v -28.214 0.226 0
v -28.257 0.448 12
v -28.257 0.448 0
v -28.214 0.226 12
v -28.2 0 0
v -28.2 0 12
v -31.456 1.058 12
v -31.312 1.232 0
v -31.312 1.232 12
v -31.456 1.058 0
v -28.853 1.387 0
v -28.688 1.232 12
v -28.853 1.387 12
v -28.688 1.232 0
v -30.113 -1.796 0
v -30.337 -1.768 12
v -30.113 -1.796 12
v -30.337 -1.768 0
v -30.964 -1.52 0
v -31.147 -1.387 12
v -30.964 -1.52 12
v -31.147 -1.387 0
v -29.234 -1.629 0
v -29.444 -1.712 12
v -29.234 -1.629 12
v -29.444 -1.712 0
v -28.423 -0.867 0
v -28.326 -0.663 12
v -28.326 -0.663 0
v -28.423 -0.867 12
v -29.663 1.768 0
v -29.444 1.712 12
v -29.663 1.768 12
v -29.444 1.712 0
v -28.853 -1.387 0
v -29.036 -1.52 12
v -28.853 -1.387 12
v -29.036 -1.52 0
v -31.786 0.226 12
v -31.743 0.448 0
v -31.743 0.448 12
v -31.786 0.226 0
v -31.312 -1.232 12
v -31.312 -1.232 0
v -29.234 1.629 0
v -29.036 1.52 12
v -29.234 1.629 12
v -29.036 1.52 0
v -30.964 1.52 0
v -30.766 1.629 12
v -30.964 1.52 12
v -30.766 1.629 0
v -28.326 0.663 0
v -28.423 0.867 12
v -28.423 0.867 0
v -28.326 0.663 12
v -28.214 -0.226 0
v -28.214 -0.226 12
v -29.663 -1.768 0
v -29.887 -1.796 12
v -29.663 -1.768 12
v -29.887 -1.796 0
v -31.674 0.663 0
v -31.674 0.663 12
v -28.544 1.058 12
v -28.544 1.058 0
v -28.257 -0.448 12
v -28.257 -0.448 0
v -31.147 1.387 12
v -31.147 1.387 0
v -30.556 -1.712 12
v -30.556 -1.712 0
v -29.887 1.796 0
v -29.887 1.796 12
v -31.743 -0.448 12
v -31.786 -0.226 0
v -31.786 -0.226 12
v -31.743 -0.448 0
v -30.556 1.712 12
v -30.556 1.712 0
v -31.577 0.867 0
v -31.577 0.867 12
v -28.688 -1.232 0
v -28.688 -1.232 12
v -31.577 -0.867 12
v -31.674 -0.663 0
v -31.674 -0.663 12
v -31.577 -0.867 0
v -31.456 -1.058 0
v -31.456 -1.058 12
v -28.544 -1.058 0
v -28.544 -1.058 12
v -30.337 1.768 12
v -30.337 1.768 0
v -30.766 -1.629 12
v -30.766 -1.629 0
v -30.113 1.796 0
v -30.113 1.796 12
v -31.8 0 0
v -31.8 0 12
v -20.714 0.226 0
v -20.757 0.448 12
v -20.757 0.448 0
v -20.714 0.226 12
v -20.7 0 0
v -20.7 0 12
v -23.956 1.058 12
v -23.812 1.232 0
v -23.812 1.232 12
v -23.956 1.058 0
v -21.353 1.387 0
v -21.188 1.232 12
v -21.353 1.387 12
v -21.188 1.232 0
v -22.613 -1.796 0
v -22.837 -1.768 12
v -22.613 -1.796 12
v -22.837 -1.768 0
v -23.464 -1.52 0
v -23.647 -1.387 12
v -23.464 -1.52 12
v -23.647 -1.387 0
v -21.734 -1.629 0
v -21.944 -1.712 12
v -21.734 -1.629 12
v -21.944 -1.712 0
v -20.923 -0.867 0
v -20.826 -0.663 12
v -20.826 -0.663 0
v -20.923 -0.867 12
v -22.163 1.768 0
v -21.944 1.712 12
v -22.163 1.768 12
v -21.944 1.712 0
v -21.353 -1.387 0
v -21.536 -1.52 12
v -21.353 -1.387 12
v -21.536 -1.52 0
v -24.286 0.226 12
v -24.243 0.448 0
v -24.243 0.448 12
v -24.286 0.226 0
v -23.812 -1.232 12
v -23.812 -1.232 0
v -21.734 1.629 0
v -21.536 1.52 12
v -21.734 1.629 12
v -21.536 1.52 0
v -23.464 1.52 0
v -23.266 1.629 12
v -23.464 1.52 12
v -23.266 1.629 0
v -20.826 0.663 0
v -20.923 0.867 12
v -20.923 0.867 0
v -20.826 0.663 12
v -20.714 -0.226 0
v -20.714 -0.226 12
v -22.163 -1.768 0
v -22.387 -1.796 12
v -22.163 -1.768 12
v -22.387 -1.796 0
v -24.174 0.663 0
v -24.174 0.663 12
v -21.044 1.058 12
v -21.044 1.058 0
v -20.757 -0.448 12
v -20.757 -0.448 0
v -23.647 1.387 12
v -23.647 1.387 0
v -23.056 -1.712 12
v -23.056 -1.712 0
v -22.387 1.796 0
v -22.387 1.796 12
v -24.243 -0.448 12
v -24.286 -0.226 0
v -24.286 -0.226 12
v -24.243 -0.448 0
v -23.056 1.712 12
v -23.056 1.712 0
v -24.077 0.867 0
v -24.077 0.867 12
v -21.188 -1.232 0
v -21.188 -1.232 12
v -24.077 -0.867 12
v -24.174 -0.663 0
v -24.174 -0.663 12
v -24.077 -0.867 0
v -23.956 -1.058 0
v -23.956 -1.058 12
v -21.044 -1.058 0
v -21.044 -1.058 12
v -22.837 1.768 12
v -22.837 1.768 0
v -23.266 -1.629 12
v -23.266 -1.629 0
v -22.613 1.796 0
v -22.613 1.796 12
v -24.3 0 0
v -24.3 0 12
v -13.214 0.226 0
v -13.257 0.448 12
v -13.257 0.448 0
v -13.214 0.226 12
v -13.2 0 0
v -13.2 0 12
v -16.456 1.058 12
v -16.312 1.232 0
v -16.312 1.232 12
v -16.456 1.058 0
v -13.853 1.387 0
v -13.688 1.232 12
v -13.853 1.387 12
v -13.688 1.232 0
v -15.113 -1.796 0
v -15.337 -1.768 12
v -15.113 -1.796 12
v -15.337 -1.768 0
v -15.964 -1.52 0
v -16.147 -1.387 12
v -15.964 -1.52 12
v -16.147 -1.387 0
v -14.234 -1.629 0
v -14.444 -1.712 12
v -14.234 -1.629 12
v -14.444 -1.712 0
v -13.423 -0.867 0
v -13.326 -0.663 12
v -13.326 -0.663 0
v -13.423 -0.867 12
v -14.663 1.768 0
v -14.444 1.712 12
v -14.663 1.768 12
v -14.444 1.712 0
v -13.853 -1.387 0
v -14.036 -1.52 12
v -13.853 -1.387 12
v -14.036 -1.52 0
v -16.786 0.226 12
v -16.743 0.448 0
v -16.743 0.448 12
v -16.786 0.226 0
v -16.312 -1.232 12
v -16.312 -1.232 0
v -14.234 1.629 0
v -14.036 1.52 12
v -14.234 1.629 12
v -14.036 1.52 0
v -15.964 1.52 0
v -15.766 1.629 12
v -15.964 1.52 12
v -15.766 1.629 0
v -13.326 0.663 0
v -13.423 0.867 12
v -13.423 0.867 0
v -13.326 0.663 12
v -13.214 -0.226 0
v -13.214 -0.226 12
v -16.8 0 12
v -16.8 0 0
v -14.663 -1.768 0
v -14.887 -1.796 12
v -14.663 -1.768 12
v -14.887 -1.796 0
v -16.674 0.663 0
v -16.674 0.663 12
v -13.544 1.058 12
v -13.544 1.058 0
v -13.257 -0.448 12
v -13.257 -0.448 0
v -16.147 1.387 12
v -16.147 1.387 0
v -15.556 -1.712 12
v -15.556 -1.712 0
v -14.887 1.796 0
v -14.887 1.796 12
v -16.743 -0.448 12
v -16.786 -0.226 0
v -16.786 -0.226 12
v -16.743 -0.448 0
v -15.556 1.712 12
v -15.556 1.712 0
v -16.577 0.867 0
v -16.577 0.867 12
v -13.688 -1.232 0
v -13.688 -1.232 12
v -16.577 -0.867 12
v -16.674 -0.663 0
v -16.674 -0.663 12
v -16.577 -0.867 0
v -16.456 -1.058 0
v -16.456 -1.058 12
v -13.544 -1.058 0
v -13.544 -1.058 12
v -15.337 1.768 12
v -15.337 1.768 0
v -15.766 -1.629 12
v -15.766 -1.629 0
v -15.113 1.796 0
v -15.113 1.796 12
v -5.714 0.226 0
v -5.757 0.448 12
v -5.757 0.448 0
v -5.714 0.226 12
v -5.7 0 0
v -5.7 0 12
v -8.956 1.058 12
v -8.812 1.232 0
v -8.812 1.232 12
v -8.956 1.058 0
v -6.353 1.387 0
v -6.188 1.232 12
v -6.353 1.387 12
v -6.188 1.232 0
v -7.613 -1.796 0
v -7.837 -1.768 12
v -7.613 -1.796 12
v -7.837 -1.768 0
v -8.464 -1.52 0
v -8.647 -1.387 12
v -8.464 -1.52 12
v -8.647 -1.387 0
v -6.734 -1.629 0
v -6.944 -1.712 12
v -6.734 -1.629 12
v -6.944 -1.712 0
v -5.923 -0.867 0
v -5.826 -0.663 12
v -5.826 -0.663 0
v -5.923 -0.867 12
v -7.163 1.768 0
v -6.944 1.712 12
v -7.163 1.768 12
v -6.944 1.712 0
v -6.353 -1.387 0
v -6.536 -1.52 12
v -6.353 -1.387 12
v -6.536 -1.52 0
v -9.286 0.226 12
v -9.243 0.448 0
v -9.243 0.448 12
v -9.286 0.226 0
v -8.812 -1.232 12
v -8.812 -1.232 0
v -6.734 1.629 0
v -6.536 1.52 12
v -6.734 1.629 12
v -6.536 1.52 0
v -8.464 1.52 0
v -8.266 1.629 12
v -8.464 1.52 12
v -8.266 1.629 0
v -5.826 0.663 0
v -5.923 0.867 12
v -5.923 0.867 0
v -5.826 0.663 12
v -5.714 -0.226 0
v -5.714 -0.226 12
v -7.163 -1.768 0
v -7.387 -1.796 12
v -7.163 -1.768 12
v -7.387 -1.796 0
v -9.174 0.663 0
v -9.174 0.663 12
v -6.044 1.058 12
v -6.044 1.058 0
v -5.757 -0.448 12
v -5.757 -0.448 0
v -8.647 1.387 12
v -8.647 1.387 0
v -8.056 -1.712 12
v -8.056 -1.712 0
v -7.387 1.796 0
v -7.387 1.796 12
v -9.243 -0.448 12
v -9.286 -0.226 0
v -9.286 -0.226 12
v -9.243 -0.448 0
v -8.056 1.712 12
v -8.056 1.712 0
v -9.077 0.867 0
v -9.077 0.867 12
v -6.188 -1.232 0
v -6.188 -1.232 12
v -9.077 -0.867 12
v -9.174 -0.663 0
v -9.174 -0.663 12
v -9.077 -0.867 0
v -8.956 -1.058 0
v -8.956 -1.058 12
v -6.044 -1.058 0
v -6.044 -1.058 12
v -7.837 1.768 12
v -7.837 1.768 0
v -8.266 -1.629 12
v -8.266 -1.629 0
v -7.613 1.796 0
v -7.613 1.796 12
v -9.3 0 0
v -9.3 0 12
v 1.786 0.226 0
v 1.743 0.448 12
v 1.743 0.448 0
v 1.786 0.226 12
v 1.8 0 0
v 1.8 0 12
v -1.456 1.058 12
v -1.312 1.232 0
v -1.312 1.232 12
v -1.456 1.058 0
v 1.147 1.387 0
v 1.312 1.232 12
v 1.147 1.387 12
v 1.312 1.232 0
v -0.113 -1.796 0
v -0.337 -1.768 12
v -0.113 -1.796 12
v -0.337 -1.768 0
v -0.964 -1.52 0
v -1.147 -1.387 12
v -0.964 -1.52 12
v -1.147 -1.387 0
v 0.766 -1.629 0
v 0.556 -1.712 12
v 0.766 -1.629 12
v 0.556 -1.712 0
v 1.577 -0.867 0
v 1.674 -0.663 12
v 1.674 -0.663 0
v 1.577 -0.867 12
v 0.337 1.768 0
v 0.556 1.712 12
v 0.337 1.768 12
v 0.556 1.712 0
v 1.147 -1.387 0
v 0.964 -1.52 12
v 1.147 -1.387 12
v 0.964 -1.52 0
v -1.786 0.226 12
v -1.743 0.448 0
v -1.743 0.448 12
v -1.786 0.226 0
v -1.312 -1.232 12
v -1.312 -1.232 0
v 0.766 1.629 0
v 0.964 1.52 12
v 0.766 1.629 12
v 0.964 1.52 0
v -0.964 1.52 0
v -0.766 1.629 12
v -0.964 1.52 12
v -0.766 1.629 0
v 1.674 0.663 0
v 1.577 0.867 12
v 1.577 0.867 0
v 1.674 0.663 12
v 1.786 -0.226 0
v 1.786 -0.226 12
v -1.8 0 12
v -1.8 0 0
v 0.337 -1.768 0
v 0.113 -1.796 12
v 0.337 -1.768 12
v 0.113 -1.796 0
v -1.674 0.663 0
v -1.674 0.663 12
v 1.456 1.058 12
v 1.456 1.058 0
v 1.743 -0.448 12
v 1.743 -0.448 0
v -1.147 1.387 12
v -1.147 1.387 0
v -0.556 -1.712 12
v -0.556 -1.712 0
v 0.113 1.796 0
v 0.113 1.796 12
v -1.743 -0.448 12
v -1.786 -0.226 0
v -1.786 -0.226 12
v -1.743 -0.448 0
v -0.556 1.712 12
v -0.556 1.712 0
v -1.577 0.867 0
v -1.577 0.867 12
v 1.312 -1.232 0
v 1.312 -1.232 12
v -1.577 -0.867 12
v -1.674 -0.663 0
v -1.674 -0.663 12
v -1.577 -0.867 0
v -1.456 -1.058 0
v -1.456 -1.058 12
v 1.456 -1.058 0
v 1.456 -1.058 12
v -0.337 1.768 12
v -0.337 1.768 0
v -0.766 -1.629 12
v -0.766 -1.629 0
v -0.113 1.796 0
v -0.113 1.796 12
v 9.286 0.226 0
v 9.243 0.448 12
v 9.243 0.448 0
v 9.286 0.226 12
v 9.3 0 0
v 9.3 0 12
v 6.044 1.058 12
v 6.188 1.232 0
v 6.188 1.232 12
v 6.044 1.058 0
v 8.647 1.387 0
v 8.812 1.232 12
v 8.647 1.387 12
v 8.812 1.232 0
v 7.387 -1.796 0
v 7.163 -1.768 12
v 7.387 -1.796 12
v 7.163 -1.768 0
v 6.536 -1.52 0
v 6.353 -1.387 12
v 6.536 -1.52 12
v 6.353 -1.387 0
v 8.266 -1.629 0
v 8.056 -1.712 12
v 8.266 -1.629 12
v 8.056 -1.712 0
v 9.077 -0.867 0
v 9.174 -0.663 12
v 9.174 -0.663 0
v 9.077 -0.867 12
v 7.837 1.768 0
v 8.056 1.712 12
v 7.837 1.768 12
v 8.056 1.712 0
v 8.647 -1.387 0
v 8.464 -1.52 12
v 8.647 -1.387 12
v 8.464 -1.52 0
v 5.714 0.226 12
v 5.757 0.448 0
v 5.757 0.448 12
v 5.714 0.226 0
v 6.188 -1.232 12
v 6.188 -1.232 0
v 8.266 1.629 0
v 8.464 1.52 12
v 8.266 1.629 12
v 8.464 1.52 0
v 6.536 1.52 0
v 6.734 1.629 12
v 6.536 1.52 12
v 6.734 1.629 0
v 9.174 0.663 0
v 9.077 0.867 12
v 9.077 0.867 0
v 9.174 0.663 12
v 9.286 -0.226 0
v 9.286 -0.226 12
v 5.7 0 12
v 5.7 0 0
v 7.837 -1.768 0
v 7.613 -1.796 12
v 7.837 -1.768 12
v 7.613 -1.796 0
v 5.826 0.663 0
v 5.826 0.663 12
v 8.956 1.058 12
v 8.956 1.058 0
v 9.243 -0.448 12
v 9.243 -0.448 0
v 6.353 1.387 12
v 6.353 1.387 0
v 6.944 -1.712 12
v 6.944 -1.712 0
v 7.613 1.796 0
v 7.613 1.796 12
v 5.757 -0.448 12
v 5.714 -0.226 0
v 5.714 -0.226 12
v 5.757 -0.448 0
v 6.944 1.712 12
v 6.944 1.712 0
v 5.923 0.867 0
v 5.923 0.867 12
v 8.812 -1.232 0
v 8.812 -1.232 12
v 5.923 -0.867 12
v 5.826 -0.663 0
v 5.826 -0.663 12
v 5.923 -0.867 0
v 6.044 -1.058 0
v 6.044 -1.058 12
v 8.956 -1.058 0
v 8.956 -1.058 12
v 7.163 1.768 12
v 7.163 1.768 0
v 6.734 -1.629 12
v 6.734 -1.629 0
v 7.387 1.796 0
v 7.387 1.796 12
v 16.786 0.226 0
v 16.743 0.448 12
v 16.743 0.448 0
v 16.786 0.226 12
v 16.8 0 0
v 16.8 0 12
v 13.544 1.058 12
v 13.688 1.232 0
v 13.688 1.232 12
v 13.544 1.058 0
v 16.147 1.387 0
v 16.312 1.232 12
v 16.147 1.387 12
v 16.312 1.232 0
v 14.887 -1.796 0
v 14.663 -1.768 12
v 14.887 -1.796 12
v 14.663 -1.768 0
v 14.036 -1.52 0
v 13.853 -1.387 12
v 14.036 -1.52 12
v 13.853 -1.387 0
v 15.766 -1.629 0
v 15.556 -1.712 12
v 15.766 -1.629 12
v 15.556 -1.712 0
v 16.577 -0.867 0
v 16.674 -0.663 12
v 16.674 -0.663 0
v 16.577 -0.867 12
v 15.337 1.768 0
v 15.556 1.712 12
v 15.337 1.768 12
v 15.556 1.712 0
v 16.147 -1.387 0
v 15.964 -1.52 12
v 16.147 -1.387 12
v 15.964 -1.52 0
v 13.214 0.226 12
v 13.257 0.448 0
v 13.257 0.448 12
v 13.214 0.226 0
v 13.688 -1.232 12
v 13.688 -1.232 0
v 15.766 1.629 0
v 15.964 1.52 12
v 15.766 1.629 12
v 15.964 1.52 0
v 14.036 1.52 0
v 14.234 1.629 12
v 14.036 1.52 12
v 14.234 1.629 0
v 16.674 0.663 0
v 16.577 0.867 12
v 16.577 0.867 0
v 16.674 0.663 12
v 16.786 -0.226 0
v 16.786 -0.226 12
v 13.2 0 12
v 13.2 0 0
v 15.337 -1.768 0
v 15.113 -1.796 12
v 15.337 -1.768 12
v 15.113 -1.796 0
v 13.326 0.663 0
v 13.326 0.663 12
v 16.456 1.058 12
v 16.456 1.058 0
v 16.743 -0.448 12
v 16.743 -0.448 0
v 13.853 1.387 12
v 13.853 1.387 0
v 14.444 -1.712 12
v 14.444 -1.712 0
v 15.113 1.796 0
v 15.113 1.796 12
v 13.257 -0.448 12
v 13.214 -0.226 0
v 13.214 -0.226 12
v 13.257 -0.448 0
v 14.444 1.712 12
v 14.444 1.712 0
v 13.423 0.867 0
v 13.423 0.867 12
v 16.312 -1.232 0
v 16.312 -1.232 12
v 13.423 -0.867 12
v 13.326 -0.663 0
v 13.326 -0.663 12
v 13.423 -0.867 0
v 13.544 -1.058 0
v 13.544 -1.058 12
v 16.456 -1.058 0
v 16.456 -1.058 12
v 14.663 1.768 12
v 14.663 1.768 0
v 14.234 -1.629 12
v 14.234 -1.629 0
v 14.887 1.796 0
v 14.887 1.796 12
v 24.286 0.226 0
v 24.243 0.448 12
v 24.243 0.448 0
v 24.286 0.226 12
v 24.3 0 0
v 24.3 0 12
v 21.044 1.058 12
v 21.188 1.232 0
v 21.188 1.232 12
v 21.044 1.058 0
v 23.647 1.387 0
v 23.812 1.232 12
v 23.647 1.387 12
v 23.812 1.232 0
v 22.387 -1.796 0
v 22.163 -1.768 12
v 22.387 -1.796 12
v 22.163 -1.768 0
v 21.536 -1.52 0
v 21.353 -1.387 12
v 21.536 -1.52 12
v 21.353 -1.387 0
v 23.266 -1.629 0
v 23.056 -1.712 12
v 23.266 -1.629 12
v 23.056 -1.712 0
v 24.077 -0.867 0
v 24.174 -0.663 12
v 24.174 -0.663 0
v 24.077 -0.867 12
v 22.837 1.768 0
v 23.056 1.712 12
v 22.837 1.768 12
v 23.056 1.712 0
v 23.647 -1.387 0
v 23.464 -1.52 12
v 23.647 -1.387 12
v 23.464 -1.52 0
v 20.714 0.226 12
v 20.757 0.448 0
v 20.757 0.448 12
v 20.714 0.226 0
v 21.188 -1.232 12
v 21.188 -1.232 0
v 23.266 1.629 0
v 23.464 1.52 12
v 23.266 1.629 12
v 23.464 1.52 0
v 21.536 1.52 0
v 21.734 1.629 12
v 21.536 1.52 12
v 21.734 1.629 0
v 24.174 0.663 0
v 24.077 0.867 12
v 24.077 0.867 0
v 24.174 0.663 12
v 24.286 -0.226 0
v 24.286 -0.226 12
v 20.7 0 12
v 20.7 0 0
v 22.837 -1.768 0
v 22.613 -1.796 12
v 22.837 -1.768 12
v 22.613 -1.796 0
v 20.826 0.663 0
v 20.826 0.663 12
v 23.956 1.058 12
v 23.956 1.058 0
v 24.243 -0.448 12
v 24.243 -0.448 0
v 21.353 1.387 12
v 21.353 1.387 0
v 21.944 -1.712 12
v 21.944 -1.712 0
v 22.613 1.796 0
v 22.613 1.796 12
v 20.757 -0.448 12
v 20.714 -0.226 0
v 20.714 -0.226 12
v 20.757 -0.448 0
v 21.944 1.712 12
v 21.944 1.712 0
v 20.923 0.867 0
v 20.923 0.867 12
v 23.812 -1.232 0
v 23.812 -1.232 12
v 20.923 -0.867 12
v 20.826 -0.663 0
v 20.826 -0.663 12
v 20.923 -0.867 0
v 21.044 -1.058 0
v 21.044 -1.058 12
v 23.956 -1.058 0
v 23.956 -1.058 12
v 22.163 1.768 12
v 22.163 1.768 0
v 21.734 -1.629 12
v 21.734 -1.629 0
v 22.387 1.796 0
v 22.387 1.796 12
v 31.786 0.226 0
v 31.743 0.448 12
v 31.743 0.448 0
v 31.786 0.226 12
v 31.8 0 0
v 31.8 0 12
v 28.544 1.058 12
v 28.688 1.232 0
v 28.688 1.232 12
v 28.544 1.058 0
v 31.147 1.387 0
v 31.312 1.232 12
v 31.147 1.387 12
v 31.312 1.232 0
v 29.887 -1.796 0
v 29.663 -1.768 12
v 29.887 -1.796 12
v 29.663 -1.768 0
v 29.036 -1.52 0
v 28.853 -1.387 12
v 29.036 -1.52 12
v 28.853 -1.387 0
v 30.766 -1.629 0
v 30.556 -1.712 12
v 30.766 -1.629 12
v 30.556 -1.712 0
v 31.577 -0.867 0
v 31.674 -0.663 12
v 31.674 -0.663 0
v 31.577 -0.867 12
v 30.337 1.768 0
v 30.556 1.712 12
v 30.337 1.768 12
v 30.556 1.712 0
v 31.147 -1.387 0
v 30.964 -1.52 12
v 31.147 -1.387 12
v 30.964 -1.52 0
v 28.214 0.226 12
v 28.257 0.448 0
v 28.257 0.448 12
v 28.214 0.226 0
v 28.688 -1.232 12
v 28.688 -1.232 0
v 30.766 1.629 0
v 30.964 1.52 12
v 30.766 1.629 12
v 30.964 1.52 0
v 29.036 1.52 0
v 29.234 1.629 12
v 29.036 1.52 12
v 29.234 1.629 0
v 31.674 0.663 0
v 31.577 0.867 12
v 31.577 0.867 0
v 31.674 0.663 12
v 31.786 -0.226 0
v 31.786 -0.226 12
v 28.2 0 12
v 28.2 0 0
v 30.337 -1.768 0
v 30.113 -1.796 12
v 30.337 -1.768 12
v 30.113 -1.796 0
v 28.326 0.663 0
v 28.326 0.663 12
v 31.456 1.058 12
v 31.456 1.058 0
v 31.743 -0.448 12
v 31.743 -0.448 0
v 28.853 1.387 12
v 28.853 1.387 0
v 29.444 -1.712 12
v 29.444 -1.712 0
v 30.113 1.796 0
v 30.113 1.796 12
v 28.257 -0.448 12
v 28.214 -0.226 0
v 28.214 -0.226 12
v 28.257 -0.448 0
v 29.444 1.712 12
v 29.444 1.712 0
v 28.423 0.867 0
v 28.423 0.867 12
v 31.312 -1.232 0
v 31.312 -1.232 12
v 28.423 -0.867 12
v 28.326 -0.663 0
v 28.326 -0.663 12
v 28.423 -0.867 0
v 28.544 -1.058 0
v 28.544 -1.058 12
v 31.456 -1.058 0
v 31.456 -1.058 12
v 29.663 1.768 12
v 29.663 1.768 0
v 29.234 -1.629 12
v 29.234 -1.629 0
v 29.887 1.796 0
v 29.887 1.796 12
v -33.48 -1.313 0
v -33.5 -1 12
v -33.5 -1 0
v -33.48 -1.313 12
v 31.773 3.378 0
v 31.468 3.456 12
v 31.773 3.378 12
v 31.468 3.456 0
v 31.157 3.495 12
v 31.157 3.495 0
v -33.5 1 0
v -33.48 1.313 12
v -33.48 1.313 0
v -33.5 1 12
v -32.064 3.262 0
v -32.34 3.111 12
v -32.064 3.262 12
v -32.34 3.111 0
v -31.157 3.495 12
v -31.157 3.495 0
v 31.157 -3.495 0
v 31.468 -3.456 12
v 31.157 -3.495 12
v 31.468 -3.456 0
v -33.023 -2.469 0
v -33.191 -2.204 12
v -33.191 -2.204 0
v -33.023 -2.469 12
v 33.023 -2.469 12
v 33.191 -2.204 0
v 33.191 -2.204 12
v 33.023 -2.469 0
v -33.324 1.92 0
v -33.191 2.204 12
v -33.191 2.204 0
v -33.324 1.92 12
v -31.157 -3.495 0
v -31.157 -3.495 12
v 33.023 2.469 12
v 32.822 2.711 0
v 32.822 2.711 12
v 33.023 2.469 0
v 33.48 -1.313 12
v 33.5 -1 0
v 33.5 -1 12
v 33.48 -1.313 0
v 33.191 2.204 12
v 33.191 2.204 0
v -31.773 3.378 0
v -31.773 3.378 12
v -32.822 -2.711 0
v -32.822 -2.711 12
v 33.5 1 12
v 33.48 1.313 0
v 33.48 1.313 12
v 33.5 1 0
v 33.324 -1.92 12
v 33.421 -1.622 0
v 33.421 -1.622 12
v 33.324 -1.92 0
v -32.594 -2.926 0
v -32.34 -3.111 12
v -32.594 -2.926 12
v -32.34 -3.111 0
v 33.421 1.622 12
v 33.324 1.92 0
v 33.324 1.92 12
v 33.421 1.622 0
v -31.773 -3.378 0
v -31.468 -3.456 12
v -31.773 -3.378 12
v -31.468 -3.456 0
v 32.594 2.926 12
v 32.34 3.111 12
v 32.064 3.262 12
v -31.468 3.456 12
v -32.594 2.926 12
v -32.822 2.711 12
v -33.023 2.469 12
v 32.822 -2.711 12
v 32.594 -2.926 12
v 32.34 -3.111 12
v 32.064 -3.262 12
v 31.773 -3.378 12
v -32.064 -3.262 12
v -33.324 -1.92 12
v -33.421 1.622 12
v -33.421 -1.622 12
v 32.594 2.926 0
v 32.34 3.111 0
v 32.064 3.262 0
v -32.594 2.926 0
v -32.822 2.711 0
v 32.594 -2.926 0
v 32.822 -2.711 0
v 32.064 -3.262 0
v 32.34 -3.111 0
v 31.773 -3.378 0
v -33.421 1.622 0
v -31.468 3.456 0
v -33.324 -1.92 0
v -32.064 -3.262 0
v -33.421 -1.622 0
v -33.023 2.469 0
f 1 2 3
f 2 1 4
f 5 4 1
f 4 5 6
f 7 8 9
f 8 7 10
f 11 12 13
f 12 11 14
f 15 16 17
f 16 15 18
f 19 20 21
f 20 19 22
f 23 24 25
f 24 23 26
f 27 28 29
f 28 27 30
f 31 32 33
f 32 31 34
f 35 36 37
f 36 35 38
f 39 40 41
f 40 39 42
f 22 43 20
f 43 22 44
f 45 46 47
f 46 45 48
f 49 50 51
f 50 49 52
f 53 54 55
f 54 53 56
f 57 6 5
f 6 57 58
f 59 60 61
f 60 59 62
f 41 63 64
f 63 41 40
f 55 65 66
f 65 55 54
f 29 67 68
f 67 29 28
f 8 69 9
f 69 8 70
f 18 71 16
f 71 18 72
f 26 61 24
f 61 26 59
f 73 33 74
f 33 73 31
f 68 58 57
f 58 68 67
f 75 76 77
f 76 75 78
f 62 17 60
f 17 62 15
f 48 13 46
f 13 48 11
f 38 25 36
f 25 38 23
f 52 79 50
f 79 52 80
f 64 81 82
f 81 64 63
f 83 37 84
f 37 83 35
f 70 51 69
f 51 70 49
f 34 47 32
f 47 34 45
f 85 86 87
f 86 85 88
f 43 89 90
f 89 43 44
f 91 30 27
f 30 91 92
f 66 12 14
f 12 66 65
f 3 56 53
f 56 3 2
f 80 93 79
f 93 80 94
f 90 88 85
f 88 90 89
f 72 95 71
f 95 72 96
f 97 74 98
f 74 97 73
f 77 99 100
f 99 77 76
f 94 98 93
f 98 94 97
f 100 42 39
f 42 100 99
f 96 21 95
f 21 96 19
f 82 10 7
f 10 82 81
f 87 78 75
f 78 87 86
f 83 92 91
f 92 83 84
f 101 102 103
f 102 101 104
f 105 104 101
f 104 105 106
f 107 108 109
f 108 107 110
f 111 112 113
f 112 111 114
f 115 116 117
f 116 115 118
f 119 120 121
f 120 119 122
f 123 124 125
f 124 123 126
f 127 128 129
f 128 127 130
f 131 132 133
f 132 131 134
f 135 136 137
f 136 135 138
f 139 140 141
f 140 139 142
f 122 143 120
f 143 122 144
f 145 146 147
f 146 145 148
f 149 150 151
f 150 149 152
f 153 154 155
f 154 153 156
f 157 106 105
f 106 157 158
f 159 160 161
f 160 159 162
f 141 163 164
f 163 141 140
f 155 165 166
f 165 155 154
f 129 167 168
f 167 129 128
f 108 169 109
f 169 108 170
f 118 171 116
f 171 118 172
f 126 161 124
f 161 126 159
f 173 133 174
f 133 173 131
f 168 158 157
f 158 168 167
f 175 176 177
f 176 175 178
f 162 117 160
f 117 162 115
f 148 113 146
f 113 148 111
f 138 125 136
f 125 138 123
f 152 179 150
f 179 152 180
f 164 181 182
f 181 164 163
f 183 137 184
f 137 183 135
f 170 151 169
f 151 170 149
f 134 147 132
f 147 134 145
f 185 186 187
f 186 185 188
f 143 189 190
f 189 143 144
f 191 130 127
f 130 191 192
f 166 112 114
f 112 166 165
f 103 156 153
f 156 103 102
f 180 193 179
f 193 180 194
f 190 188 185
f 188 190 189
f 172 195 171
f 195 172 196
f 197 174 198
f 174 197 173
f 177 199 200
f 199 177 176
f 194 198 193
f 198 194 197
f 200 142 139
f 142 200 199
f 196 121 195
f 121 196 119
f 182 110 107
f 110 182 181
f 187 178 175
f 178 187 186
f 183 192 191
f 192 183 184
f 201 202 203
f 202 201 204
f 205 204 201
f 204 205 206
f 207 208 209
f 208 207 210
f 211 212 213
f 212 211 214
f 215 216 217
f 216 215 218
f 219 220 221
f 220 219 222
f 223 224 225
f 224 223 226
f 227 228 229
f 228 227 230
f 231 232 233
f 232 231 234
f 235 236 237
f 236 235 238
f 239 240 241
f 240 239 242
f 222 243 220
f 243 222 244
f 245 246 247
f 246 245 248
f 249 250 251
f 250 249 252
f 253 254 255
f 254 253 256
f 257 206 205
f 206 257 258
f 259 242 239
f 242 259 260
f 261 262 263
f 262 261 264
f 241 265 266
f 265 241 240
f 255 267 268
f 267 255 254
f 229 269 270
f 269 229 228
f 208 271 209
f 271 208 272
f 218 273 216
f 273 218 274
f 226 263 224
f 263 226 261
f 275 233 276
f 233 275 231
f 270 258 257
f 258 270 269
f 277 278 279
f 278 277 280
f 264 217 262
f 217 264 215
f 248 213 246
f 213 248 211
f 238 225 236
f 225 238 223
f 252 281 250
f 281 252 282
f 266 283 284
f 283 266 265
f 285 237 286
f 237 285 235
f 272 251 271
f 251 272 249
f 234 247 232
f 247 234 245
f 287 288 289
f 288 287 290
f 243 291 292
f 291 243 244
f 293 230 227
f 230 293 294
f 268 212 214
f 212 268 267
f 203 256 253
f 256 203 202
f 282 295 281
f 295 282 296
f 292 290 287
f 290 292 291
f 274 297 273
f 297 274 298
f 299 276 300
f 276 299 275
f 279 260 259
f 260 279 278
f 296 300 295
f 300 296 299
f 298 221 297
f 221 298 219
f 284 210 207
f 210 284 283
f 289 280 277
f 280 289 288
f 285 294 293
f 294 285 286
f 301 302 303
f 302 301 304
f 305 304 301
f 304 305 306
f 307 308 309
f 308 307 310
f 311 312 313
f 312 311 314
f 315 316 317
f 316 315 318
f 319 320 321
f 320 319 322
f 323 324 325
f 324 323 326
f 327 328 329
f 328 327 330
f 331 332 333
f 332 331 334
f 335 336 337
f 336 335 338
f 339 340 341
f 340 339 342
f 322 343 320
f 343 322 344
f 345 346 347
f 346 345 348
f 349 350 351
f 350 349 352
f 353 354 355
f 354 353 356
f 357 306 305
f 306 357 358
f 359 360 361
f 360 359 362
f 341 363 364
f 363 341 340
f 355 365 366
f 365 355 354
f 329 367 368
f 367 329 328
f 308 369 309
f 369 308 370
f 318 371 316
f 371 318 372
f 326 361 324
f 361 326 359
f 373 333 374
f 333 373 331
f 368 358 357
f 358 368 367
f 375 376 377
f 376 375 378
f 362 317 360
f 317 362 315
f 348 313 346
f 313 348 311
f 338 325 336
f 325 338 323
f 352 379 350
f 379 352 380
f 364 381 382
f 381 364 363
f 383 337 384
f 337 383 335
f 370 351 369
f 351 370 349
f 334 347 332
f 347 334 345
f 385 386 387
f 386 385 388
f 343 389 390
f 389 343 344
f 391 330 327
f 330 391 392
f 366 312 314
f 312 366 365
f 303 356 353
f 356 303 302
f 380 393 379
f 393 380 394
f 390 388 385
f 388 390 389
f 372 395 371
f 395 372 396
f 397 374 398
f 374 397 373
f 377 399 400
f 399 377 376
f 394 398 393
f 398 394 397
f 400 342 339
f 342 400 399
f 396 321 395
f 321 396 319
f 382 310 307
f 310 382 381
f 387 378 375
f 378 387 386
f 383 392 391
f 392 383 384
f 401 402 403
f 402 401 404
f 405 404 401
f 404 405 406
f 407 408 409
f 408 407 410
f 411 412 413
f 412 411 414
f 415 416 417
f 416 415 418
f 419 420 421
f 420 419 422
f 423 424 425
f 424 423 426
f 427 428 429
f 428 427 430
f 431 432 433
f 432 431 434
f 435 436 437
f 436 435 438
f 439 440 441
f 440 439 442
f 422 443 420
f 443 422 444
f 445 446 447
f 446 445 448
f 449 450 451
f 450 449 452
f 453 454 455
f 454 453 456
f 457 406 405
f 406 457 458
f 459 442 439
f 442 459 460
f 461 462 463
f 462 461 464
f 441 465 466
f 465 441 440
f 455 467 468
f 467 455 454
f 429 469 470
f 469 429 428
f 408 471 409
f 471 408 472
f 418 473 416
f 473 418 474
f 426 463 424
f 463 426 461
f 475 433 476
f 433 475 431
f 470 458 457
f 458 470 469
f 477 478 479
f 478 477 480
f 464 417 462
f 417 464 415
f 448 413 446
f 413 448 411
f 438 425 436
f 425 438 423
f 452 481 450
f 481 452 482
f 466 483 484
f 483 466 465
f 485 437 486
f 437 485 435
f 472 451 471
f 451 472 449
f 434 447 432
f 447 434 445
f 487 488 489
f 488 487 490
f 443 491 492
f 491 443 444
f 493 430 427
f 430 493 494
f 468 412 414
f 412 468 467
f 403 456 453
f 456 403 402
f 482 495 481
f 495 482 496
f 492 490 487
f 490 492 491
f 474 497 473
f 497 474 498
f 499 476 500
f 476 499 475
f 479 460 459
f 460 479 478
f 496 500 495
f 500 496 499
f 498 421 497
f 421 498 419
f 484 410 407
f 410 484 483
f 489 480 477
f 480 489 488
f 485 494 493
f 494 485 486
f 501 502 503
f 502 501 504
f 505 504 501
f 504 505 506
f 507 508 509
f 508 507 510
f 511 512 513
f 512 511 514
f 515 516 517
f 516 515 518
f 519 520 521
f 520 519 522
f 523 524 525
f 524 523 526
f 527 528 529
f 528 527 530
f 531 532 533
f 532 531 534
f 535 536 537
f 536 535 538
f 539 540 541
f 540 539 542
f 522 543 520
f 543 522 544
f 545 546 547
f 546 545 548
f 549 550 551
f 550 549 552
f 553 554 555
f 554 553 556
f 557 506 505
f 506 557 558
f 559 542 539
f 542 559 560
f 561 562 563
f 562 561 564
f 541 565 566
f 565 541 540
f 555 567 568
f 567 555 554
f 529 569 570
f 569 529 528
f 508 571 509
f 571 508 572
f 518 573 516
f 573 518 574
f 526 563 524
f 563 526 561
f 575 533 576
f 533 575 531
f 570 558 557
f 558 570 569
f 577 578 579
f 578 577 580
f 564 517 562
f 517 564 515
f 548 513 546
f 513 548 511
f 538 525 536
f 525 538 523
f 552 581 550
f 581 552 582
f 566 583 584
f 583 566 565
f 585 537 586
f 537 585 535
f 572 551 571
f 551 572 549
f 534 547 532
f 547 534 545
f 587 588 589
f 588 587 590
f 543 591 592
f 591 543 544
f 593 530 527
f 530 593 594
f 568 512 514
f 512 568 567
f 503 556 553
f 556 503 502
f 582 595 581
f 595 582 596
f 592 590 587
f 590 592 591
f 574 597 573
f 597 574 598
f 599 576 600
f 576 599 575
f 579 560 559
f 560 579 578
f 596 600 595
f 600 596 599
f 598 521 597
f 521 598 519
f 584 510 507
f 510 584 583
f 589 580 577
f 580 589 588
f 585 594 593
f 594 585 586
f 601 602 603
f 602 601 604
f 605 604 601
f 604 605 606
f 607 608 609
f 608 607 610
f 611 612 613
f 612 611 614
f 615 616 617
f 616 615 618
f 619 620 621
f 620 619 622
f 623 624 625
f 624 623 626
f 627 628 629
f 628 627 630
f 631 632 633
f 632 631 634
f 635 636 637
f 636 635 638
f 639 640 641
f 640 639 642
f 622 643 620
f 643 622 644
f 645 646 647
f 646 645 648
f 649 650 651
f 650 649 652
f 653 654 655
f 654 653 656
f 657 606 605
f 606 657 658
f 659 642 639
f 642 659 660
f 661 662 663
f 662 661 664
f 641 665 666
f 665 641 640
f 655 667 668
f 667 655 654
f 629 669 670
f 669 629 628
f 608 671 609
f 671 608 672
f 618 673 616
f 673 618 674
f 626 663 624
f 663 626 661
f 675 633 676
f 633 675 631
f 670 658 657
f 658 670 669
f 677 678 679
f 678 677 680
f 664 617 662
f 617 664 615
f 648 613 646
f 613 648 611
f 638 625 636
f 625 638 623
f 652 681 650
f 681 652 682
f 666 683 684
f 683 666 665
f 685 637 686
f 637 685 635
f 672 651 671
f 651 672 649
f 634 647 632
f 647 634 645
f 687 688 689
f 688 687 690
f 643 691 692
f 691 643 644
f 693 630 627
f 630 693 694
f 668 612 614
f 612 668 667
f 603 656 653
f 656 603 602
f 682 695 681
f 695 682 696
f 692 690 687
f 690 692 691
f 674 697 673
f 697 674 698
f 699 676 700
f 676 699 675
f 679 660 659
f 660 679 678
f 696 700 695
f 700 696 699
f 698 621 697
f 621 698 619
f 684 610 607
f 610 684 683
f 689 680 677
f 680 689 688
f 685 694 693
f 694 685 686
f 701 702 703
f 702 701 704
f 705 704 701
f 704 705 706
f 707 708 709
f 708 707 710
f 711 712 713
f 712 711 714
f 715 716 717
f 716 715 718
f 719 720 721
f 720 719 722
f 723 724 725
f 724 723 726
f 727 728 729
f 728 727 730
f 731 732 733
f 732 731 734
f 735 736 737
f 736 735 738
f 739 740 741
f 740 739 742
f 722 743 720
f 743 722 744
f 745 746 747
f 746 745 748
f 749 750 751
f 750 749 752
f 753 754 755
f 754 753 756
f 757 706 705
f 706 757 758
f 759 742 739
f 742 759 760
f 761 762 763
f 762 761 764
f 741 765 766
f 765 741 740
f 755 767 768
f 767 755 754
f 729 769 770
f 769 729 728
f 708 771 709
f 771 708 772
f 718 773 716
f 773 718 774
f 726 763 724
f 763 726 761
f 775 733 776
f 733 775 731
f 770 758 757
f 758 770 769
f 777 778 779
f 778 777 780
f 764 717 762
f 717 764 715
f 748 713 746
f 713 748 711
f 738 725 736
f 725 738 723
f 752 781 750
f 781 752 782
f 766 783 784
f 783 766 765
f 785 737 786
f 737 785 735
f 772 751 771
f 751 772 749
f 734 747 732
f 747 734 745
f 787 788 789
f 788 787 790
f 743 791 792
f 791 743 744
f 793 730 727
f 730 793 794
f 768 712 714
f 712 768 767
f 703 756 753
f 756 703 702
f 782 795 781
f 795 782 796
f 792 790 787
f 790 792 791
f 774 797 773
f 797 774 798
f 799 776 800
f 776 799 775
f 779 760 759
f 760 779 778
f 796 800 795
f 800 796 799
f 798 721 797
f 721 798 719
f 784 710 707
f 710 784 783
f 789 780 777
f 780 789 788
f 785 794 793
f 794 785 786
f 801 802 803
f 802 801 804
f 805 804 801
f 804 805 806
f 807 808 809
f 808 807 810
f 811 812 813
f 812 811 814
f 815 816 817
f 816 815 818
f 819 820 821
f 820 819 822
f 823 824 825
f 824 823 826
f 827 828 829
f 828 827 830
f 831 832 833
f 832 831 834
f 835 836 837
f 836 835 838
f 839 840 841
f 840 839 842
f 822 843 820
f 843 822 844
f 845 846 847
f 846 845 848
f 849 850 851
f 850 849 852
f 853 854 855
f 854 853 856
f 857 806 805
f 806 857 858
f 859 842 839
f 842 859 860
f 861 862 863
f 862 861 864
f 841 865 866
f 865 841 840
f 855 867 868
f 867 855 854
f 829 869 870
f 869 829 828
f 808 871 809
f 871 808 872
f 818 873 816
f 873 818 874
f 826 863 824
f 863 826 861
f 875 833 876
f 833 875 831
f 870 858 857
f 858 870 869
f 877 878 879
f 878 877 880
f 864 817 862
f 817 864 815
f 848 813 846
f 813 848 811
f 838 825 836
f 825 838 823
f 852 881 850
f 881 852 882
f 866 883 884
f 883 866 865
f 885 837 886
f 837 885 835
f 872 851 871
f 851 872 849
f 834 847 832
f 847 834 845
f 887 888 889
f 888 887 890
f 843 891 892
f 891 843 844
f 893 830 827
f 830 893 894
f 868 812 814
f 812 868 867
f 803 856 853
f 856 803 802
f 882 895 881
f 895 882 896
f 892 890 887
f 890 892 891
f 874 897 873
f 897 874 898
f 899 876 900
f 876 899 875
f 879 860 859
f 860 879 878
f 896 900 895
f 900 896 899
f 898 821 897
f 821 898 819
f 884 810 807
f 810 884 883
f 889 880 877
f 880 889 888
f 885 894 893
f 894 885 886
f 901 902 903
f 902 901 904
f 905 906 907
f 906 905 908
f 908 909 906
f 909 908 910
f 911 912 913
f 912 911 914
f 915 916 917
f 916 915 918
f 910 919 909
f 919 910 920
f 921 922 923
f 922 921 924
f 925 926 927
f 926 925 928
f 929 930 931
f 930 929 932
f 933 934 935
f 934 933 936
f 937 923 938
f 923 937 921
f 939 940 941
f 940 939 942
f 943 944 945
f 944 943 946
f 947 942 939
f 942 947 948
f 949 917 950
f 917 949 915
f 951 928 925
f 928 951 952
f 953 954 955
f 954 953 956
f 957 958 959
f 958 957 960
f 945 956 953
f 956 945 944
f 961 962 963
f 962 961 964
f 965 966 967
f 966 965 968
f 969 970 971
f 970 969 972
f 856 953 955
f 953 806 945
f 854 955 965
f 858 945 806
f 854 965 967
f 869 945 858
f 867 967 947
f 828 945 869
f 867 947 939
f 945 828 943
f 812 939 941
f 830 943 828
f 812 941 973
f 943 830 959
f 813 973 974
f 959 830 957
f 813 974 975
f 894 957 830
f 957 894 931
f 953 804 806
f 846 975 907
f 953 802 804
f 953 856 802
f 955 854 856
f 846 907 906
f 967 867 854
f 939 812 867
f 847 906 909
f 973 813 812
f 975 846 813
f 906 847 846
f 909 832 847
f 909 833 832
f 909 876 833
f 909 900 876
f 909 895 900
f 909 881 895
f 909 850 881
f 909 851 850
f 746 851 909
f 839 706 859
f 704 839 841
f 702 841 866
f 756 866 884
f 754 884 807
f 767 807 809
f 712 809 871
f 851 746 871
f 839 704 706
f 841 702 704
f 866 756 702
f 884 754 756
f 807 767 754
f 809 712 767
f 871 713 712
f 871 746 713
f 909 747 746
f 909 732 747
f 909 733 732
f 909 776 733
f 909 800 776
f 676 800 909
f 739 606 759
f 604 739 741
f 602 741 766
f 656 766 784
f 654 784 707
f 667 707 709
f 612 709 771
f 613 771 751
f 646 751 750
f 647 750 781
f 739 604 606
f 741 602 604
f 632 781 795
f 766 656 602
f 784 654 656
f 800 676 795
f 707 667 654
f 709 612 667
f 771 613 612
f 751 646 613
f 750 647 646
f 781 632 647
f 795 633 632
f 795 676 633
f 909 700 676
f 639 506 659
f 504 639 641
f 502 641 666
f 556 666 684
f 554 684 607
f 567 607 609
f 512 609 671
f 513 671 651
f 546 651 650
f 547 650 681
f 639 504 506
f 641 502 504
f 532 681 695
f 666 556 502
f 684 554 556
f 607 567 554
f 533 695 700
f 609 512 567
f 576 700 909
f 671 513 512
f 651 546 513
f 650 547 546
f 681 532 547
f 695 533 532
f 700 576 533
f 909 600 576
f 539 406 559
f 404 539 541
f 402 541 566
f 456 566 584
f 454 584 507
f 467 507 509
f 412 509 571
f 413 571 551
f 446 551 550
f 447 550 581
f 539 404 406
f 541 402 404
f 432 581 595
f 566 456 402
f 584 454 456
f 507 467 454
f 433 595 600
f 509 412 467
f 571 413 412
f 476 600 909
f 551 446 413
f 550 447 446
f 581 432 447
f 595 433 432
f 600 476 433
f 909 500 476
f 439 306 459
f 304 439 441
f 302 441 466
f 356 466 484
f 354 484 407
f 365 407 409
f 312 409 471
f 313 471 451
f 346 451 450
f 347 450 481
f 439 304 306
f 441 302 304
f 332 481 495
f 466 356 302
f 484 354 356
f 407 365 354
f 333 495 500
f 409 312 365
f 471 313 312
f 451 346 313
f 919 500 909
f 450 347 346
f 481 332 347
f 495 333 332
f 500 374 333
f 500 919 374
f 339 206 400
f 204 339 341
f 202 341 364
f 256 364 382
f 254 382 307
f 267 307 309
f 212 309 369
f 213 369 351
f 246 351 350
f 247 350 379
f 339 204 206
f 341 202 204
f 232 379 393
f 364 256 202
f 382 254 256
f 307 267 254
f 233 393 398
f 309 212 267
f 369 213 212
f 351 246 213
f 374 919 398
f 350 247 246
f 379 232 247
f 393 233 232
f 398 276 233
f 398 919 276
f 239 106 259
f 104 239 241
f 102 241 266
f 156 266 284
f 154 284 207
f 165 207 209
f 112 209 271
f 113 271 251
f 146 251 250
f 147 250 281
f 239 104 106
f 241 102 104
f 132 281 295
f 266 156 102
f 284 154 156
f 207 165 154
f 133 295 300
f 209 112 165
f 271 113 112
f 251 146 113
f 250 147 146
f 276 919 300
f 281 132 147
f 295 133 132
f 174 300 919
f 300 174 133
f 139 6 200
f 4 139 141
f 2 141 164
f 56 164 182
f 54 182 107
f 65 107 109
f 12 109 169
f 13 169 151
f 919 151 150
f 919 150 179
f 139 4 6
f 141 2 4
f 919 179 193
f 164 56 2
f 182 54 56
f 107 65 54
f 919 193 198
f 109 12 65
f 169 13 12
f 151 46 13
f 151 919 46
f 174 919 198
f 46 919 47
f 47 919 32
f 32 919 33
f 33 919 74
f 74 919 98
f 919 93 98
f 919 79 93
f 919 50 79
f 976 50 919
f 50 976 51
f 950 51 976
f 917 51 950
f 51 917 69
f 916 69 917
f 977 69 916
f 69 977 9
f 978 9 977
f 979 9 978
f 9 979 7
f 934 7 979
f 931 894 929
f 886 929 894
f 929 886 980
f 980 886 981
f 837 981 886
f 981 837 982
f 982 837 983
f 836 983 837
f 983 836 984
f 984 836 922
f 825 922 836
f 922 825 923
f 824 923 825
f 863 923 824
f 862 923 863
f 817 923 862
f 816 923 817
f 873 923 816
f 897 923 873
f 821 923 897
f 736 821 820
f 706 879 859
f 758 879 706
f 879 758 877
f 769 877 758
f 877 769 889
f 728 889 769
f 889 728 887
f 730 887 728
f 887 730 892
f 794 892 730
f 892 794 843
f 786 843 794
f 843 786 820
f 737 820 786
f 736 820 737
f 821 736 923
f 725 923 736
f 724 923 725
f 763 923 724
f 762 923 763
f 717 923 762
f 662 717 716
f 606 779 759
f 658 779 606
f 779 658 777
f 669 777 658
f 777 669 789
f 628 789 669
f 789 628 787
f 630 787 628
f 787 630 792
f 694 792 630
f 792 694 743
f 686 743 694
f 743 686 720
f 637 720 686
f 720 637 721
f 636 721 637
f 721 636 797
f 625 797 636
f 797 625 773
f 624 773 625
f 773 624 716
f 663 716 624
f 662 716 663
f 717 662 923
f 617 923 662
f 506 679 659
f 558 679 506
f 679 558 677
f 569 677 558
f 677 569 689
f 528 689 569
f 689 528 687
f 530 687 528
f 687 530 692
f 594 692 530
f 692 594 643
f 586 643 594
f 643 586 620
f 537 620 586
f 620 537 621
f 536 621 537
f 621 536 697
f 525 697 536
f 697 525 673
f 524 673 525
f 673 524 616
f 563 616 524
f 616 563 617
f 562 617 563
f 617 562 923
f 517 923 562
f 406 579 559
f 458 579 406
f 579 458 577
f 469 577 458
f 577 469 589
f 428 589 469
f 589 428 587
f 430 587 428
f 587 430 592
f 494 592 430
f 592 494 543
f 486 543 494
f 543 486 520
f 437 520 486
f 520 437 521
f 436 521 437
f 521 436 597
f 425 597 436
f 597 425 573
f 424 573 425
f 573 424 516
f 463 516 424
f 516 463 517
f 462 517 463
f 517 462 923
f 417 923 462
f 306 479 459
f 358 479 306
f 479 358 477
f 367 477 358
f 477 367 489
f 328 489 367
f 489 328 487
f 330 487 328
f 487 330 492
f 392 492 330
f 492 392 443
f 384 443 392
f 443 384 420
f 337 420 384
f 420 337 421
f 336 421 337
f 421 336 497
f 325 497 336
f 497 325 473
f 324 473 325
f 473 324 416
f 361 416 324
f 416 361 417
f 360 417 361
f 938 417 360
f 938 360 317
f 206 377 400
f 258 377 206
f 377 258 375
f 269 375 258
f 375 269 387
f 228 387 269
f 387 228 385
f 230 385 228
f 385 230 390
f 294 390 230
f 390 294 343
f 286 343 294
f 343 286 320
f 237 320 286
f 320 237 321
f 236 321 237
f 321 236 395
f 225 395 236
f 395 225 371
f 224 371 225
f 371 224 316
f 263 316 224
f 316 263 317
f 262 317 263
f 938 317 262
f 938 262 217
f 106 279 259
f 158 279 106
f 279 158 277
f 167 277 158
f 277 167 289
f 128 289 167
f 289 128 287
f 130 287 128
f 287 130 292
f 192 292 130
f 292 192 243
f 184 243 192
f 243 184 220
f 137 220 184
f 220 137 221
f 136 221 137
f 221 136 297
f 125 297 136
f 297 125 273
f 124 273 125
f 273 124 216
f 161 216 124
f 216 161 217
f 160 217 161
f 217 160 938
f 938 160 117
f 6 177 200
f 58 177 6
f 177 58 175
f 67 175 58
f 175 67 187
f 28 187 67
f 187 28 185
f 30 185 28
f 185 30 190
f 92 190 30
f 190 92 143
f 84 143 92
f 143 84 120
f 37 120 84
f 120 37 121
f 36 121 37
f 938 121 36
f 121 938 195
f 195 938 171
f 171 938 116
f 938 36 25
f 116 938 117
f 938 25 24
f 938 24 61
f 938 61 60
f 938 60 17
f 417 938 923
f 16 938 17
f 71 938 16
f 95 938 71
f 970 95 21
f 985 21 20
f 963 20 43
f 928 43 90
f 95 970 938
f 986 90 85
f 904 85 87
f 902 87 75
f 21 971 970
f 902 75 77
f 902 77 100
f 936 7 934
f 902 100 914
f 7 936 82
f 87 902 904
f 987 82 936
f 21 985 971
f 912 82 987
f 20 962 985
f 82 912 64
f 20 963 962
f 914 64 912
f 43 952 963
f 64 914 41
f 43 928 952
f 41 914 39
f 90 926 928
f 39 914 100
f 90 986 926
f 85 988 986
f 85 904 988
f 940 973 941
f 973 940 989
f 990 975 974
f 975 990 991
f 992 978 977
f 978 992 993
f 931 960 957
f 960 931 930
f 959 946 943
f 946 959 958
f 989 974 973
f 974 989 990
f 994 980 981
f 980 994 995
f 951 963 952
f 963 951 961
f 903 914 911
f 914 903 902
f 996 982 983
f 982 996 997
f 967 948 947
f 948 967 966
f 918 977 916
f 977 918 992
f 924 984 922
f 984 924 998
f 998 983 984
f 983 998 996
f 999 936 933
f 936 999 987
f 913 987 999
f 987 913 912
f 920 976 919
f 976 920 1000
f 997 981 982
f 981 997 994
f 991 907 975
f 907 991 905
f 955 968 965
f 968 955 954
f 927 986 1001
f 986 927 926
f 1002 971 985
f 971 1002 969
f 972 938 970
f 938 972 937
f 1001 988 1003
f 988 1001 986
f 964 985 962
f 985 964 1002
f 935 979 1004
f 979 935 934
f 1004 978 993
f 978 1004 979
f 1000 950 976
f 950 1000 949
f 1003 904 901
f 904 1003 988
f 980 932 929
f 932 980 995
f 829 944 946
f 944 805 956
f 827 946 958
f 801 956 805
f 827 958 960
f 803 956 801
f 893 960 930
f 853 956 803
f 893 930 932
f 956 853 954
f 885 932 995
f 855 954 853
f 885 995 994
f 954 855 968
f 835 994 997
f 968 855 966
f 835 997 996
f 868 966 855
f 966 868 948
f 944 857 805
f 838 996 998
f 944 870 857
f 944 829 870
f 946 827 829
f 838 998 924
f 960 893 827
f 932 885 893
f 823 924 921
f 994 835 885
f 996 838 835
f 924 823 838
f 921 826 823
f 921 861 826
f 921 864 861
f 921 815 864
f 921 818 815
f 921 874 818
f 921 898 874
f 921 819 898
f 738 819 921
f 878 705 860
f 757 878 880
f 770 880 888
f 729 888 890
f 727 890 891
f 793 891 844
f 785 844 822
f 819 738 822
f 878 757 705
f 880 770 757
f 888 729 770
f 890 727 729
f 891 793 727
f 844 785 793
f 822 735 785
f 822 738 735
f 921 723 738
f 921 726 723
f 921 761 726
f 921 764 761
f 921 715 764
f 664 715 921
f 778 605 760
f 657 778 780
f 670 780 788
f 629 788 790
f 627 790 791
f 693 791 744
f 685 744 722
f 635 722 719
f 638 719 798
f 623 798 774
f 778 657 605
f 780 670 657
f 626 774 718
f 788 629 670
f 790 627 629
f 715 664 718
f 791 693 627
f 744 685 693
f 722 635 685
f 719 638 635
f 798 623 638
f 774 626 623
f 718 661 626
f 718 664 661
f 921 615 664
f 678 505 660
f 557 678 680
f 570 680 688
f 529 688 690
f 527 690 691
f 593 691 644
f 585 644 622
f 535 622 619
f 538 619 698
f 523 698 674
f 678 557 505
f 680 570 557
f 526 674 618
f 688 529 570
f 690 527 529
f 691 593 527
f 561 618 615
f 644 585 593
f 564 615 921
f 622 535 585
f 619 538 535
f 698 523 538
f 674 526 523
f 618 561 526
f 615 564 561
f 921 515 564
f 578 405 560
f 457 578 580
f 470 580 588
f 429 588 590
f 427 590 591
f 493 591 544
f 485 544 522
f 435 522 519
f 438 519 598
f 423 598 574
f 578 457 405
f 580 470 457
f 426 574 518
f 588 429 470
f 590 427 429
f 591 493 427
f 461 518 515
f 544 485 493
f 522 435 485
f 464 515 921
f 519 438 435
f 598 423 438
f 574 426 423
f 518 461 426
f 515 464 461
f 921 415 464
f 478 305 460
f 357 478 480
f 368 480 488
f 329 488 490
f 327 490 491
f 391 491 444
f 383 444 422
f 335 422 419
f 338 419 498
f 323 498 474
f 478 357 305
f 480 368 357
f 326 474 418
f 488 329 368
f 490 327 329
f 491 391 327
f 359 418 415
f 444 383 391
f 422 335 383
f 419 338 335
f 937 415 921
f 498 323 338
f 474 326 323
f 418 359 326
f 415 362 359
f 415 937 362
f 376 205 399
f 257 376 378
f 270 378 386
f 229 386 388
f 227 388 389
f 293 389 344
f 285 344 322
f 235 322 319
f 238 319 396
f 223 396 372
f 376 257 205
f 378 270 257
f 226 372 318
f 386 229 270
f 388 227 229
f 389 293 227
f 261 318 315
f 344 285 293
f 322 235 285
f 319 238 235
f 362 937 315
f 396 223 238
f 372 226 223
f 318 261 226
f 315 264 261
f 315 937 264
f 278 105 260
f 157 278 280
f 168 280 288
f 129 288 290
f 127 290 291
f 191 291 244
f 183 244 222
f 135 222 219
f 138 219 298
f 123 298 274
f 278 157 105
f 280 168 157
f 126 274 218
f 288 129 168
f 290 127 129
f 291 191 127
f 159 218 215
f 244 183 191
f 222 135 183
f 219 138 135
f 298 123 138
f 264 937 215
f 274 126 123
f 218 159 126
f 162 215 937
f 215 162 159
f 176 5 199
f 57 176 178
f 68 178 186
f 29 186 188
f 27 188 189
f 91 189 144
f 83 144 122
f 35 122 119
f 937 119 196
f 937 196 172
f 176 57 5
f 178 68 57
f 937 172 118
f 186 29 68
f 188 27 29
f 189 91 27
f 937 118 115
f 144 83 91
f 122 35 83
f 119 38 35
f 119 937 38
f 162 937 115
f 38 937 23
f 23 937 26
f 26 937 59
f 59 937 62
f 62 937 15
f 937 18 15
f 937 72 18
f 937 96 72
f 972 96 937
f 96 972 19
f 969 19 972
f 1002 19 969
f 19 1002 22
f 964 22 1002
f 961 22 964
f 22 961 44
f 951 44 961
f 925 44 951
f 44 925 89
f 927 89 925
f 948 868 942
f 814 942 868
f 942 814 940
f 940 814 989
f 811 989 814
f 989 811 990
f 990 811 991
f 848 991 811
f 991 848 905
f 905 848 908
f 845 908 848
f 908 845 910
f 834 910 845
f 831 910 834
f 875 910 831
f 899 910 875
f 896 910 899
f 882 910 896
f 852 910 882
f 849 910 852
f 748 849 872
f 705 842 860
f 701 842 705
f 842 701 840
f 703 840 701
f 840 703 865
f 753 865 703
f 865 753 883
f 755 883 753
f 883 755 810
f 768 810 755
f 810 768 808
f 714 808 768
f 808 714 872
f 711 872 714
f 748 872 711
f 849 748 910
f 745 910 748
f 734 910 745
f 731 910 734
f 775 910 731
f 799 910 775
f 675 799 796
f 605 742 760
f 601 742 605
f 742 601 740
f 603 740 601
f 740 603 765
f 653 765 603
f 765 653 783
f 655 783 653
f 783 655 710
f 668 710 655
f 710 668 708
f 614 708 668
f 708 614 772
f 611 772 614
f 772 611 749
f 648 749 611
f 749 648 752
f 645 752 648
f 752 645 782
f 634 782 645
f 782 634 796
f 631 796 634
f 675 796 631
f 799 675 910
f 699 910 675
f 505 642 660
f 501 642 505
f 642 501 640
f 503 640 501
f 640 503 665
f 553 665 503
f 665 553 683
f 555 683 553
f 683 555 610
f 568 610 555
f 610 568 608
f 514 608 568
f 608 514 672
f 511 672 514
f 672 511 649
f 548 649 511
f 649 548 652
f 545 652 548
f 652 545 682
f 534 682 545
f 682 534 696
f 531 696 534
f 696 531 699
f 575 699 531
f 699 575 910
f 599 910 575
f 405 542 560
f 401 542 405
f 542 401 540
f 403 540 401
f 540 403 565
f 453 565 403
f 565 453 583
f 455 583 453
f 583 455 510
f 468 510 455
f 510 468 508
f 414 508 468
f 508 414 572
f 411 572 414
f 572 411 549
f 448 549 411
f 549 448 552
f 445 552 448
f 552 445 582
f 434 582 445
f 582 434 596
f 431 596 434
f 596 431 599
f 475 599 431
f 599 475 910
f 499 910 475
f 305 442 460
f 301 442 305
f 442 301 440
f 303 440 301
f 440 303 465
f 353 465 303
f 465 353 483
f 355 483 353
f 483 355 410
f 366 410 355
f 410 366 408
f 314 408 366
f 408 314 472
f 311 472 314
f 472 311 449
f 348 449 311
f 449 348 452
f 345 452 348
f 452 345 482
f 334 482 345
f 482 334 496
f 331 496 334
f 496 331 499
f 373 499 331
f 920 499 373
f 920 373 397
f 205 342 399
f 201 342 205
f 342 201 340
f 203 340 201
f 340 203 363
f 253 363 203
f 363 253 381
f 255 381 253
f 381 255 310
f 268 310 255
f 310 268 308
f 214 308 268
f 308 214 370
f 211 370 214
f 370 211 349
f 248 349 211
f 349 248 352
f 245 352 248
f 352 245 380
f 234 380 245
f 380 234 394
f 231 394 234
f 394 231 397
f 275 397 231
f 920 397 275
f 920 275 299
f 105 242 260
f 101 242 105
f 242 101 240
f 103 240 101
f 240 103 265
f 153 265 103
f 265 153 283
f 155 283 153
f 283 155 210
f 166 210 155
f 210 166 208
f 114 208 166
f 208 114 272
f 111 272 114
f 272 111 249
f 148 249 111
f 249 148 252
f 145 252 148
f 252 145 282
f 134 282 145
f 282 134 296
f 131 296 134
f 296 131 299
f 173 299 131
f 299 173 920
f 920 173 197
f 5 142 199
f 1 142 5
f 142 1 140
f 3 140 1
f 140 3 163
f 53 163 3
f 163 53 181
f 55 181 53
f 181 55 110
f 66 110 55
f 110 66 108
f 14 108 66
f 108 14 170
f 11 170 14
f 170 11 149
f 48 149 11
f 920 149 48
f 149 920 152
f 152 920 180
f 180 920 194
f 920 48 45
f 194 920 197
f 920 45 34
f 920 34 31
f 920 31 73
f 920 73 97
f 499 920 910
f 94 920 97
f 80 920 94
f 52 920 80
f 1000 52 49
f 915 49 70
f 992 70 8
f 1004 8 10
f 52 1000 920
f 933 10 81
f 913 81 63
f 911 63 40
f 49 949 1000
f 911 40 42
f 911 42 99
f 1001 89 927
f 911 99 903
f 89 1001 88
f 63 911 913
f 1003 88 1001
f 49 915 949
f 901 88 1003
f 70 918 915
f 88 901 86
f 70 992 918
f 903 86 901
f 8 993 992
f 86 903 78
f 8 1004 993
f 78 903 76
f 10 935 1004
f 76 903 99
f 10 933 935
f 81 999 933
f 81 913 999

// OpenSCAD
$fn = 50;


difference() {
	union() {
		translate(v = [0, 0, 0]) {
			rotate(a = [0, 0, 0]) {
				hull() {
					translate(v = [-31.0000000000, 1.0000000000, 0]) {
						rotate(a = [0, 0, 0]) {
							translate(v = [0, 0, 0]) {
								rotate(a = [0, 0, 0]) {
									cylinder(h = 12, r = 2.5000000000);
								}
							}
						}
					}
					translate(v = [31.0000000000, 1.0000000000, 0]) {
						rotate(a = [0, 0, 0]) {
							translate(v = [0, 0, 0]) {
								rotate(a = [0, 0, 0]) {
									cylinder(h = 12, r = 2.5000000000);
								}
							}
						}
					}
					translate(v = [-31.0000000000, -1.0000000000, 0]) {
						rotate(a = [0, 0, 0]) {
							translate(v = [0, 0, 0]) {
								rotate(a = [0, 0, 0]) {
									cylinder(h = 12, r = 2.5000000000);
								}
							}
						}
					}
					translate(v = [31.0000000000, -1.0000000000, 0]) {
						rotate(a = [0, 0, 0]) {
							translate(v = [0, 0, 0]) {
								rotate(a = [0, 0, 0]) {
									cylinder(h = 12, r = 2.5000000000);
								}
							}
						}
					}
				}
			}
		}
	}
	union() {
		translate(v = [-30.0000000000, 0.0000000000, 0]) {
			rotate(a = [0, 0, 0]) {
				translate(v = [0, 0, -50]) {
					rotate(a = [0, 0, 0]) {
						cylinder(h = 100, r = 1.8000000000);
					}
				}
			}
		}
		translate(v = [-22.5000000000, 0.0000000000, 0]) {
			rotate(a = [0, 0, 0]) {
				translate(v = [0, 0, -50]) {
					rotate(a = [0, 0, 0]) {
						cylinder(h = 100, r = 1.8000000000);
					}
				}
			}
		}
		translate(v = [-15.0000000000, 0.0000000000, 0]) {
			rotate(a = [0, 0, 0]) {
				translate(v = [0, 0, -50]) {
					rotate(a = [0, 0, 0]) {
						cylinder(h = 100, r = 1.8000000000);
					}
				}
			}
		}
		translate(v = [-7.5000000000, 0.0000000000, 0]) {
			rotate(a = [0, 0, 0]) {
				translate(v = [0, 0, -50]) {
					rotate(a = [0, 0, 0]) {
						cylinder(h = 100, r = 1.8000000000);
					}
				}
			}
		}
		translate(v = [0.0000000000, 0.0000000000, 0]) {
			rotate(a = [0, 0, 0]) {
				translate(v = [0, 0, -50]) {
					rotate(a = [0, 0, 0]) {
						cylinder(h = 100, r = 1.8000000000);
					}
				}
			}
		}
		translate(v = [7.5000000000, 0.0000000000, 0]) {
			rotate(a = [0, 0, 0]) {
				translate(v = [0, 0, -50]) {
					rotate(a = [0, 0, 0]) {
						cylinder(h = 100, r = 1.8000000000);
					}
				}
			}
		}
		translate(v = [15.0000000000, 0.0000000000, 0]) {
			rotate(a = [0, 0, 0]) {
				translate(v = [0, 0, -50]) {
					rotate(a = [0, 0, 0]) {
						cylinder(h = 100, r = 1.8000000000);
					}
				}
			}
		}
		translate(v = [22.5000000000, 0.0000000000, 0]) {
			rotate(a = [0, 0, 0]) {
				translate(v = [0, 0, -50]) {
					rotate(a = [0, 0, 0]) {
						cylinder(h = 100, r = 1.8000000000);
					}
				}
			}
		}
		translate(v = [30.0000000000, 0.0000000000, 0]) {
			rotate(a = [0, 0, 0]) {
				translate(v = [0, 0, -50]) {
					rotate(a = [0, 0, 0]) {
						cylinder(h = 100, r = 1.8000000000);
					}
				}
			}
		}
	}
}
